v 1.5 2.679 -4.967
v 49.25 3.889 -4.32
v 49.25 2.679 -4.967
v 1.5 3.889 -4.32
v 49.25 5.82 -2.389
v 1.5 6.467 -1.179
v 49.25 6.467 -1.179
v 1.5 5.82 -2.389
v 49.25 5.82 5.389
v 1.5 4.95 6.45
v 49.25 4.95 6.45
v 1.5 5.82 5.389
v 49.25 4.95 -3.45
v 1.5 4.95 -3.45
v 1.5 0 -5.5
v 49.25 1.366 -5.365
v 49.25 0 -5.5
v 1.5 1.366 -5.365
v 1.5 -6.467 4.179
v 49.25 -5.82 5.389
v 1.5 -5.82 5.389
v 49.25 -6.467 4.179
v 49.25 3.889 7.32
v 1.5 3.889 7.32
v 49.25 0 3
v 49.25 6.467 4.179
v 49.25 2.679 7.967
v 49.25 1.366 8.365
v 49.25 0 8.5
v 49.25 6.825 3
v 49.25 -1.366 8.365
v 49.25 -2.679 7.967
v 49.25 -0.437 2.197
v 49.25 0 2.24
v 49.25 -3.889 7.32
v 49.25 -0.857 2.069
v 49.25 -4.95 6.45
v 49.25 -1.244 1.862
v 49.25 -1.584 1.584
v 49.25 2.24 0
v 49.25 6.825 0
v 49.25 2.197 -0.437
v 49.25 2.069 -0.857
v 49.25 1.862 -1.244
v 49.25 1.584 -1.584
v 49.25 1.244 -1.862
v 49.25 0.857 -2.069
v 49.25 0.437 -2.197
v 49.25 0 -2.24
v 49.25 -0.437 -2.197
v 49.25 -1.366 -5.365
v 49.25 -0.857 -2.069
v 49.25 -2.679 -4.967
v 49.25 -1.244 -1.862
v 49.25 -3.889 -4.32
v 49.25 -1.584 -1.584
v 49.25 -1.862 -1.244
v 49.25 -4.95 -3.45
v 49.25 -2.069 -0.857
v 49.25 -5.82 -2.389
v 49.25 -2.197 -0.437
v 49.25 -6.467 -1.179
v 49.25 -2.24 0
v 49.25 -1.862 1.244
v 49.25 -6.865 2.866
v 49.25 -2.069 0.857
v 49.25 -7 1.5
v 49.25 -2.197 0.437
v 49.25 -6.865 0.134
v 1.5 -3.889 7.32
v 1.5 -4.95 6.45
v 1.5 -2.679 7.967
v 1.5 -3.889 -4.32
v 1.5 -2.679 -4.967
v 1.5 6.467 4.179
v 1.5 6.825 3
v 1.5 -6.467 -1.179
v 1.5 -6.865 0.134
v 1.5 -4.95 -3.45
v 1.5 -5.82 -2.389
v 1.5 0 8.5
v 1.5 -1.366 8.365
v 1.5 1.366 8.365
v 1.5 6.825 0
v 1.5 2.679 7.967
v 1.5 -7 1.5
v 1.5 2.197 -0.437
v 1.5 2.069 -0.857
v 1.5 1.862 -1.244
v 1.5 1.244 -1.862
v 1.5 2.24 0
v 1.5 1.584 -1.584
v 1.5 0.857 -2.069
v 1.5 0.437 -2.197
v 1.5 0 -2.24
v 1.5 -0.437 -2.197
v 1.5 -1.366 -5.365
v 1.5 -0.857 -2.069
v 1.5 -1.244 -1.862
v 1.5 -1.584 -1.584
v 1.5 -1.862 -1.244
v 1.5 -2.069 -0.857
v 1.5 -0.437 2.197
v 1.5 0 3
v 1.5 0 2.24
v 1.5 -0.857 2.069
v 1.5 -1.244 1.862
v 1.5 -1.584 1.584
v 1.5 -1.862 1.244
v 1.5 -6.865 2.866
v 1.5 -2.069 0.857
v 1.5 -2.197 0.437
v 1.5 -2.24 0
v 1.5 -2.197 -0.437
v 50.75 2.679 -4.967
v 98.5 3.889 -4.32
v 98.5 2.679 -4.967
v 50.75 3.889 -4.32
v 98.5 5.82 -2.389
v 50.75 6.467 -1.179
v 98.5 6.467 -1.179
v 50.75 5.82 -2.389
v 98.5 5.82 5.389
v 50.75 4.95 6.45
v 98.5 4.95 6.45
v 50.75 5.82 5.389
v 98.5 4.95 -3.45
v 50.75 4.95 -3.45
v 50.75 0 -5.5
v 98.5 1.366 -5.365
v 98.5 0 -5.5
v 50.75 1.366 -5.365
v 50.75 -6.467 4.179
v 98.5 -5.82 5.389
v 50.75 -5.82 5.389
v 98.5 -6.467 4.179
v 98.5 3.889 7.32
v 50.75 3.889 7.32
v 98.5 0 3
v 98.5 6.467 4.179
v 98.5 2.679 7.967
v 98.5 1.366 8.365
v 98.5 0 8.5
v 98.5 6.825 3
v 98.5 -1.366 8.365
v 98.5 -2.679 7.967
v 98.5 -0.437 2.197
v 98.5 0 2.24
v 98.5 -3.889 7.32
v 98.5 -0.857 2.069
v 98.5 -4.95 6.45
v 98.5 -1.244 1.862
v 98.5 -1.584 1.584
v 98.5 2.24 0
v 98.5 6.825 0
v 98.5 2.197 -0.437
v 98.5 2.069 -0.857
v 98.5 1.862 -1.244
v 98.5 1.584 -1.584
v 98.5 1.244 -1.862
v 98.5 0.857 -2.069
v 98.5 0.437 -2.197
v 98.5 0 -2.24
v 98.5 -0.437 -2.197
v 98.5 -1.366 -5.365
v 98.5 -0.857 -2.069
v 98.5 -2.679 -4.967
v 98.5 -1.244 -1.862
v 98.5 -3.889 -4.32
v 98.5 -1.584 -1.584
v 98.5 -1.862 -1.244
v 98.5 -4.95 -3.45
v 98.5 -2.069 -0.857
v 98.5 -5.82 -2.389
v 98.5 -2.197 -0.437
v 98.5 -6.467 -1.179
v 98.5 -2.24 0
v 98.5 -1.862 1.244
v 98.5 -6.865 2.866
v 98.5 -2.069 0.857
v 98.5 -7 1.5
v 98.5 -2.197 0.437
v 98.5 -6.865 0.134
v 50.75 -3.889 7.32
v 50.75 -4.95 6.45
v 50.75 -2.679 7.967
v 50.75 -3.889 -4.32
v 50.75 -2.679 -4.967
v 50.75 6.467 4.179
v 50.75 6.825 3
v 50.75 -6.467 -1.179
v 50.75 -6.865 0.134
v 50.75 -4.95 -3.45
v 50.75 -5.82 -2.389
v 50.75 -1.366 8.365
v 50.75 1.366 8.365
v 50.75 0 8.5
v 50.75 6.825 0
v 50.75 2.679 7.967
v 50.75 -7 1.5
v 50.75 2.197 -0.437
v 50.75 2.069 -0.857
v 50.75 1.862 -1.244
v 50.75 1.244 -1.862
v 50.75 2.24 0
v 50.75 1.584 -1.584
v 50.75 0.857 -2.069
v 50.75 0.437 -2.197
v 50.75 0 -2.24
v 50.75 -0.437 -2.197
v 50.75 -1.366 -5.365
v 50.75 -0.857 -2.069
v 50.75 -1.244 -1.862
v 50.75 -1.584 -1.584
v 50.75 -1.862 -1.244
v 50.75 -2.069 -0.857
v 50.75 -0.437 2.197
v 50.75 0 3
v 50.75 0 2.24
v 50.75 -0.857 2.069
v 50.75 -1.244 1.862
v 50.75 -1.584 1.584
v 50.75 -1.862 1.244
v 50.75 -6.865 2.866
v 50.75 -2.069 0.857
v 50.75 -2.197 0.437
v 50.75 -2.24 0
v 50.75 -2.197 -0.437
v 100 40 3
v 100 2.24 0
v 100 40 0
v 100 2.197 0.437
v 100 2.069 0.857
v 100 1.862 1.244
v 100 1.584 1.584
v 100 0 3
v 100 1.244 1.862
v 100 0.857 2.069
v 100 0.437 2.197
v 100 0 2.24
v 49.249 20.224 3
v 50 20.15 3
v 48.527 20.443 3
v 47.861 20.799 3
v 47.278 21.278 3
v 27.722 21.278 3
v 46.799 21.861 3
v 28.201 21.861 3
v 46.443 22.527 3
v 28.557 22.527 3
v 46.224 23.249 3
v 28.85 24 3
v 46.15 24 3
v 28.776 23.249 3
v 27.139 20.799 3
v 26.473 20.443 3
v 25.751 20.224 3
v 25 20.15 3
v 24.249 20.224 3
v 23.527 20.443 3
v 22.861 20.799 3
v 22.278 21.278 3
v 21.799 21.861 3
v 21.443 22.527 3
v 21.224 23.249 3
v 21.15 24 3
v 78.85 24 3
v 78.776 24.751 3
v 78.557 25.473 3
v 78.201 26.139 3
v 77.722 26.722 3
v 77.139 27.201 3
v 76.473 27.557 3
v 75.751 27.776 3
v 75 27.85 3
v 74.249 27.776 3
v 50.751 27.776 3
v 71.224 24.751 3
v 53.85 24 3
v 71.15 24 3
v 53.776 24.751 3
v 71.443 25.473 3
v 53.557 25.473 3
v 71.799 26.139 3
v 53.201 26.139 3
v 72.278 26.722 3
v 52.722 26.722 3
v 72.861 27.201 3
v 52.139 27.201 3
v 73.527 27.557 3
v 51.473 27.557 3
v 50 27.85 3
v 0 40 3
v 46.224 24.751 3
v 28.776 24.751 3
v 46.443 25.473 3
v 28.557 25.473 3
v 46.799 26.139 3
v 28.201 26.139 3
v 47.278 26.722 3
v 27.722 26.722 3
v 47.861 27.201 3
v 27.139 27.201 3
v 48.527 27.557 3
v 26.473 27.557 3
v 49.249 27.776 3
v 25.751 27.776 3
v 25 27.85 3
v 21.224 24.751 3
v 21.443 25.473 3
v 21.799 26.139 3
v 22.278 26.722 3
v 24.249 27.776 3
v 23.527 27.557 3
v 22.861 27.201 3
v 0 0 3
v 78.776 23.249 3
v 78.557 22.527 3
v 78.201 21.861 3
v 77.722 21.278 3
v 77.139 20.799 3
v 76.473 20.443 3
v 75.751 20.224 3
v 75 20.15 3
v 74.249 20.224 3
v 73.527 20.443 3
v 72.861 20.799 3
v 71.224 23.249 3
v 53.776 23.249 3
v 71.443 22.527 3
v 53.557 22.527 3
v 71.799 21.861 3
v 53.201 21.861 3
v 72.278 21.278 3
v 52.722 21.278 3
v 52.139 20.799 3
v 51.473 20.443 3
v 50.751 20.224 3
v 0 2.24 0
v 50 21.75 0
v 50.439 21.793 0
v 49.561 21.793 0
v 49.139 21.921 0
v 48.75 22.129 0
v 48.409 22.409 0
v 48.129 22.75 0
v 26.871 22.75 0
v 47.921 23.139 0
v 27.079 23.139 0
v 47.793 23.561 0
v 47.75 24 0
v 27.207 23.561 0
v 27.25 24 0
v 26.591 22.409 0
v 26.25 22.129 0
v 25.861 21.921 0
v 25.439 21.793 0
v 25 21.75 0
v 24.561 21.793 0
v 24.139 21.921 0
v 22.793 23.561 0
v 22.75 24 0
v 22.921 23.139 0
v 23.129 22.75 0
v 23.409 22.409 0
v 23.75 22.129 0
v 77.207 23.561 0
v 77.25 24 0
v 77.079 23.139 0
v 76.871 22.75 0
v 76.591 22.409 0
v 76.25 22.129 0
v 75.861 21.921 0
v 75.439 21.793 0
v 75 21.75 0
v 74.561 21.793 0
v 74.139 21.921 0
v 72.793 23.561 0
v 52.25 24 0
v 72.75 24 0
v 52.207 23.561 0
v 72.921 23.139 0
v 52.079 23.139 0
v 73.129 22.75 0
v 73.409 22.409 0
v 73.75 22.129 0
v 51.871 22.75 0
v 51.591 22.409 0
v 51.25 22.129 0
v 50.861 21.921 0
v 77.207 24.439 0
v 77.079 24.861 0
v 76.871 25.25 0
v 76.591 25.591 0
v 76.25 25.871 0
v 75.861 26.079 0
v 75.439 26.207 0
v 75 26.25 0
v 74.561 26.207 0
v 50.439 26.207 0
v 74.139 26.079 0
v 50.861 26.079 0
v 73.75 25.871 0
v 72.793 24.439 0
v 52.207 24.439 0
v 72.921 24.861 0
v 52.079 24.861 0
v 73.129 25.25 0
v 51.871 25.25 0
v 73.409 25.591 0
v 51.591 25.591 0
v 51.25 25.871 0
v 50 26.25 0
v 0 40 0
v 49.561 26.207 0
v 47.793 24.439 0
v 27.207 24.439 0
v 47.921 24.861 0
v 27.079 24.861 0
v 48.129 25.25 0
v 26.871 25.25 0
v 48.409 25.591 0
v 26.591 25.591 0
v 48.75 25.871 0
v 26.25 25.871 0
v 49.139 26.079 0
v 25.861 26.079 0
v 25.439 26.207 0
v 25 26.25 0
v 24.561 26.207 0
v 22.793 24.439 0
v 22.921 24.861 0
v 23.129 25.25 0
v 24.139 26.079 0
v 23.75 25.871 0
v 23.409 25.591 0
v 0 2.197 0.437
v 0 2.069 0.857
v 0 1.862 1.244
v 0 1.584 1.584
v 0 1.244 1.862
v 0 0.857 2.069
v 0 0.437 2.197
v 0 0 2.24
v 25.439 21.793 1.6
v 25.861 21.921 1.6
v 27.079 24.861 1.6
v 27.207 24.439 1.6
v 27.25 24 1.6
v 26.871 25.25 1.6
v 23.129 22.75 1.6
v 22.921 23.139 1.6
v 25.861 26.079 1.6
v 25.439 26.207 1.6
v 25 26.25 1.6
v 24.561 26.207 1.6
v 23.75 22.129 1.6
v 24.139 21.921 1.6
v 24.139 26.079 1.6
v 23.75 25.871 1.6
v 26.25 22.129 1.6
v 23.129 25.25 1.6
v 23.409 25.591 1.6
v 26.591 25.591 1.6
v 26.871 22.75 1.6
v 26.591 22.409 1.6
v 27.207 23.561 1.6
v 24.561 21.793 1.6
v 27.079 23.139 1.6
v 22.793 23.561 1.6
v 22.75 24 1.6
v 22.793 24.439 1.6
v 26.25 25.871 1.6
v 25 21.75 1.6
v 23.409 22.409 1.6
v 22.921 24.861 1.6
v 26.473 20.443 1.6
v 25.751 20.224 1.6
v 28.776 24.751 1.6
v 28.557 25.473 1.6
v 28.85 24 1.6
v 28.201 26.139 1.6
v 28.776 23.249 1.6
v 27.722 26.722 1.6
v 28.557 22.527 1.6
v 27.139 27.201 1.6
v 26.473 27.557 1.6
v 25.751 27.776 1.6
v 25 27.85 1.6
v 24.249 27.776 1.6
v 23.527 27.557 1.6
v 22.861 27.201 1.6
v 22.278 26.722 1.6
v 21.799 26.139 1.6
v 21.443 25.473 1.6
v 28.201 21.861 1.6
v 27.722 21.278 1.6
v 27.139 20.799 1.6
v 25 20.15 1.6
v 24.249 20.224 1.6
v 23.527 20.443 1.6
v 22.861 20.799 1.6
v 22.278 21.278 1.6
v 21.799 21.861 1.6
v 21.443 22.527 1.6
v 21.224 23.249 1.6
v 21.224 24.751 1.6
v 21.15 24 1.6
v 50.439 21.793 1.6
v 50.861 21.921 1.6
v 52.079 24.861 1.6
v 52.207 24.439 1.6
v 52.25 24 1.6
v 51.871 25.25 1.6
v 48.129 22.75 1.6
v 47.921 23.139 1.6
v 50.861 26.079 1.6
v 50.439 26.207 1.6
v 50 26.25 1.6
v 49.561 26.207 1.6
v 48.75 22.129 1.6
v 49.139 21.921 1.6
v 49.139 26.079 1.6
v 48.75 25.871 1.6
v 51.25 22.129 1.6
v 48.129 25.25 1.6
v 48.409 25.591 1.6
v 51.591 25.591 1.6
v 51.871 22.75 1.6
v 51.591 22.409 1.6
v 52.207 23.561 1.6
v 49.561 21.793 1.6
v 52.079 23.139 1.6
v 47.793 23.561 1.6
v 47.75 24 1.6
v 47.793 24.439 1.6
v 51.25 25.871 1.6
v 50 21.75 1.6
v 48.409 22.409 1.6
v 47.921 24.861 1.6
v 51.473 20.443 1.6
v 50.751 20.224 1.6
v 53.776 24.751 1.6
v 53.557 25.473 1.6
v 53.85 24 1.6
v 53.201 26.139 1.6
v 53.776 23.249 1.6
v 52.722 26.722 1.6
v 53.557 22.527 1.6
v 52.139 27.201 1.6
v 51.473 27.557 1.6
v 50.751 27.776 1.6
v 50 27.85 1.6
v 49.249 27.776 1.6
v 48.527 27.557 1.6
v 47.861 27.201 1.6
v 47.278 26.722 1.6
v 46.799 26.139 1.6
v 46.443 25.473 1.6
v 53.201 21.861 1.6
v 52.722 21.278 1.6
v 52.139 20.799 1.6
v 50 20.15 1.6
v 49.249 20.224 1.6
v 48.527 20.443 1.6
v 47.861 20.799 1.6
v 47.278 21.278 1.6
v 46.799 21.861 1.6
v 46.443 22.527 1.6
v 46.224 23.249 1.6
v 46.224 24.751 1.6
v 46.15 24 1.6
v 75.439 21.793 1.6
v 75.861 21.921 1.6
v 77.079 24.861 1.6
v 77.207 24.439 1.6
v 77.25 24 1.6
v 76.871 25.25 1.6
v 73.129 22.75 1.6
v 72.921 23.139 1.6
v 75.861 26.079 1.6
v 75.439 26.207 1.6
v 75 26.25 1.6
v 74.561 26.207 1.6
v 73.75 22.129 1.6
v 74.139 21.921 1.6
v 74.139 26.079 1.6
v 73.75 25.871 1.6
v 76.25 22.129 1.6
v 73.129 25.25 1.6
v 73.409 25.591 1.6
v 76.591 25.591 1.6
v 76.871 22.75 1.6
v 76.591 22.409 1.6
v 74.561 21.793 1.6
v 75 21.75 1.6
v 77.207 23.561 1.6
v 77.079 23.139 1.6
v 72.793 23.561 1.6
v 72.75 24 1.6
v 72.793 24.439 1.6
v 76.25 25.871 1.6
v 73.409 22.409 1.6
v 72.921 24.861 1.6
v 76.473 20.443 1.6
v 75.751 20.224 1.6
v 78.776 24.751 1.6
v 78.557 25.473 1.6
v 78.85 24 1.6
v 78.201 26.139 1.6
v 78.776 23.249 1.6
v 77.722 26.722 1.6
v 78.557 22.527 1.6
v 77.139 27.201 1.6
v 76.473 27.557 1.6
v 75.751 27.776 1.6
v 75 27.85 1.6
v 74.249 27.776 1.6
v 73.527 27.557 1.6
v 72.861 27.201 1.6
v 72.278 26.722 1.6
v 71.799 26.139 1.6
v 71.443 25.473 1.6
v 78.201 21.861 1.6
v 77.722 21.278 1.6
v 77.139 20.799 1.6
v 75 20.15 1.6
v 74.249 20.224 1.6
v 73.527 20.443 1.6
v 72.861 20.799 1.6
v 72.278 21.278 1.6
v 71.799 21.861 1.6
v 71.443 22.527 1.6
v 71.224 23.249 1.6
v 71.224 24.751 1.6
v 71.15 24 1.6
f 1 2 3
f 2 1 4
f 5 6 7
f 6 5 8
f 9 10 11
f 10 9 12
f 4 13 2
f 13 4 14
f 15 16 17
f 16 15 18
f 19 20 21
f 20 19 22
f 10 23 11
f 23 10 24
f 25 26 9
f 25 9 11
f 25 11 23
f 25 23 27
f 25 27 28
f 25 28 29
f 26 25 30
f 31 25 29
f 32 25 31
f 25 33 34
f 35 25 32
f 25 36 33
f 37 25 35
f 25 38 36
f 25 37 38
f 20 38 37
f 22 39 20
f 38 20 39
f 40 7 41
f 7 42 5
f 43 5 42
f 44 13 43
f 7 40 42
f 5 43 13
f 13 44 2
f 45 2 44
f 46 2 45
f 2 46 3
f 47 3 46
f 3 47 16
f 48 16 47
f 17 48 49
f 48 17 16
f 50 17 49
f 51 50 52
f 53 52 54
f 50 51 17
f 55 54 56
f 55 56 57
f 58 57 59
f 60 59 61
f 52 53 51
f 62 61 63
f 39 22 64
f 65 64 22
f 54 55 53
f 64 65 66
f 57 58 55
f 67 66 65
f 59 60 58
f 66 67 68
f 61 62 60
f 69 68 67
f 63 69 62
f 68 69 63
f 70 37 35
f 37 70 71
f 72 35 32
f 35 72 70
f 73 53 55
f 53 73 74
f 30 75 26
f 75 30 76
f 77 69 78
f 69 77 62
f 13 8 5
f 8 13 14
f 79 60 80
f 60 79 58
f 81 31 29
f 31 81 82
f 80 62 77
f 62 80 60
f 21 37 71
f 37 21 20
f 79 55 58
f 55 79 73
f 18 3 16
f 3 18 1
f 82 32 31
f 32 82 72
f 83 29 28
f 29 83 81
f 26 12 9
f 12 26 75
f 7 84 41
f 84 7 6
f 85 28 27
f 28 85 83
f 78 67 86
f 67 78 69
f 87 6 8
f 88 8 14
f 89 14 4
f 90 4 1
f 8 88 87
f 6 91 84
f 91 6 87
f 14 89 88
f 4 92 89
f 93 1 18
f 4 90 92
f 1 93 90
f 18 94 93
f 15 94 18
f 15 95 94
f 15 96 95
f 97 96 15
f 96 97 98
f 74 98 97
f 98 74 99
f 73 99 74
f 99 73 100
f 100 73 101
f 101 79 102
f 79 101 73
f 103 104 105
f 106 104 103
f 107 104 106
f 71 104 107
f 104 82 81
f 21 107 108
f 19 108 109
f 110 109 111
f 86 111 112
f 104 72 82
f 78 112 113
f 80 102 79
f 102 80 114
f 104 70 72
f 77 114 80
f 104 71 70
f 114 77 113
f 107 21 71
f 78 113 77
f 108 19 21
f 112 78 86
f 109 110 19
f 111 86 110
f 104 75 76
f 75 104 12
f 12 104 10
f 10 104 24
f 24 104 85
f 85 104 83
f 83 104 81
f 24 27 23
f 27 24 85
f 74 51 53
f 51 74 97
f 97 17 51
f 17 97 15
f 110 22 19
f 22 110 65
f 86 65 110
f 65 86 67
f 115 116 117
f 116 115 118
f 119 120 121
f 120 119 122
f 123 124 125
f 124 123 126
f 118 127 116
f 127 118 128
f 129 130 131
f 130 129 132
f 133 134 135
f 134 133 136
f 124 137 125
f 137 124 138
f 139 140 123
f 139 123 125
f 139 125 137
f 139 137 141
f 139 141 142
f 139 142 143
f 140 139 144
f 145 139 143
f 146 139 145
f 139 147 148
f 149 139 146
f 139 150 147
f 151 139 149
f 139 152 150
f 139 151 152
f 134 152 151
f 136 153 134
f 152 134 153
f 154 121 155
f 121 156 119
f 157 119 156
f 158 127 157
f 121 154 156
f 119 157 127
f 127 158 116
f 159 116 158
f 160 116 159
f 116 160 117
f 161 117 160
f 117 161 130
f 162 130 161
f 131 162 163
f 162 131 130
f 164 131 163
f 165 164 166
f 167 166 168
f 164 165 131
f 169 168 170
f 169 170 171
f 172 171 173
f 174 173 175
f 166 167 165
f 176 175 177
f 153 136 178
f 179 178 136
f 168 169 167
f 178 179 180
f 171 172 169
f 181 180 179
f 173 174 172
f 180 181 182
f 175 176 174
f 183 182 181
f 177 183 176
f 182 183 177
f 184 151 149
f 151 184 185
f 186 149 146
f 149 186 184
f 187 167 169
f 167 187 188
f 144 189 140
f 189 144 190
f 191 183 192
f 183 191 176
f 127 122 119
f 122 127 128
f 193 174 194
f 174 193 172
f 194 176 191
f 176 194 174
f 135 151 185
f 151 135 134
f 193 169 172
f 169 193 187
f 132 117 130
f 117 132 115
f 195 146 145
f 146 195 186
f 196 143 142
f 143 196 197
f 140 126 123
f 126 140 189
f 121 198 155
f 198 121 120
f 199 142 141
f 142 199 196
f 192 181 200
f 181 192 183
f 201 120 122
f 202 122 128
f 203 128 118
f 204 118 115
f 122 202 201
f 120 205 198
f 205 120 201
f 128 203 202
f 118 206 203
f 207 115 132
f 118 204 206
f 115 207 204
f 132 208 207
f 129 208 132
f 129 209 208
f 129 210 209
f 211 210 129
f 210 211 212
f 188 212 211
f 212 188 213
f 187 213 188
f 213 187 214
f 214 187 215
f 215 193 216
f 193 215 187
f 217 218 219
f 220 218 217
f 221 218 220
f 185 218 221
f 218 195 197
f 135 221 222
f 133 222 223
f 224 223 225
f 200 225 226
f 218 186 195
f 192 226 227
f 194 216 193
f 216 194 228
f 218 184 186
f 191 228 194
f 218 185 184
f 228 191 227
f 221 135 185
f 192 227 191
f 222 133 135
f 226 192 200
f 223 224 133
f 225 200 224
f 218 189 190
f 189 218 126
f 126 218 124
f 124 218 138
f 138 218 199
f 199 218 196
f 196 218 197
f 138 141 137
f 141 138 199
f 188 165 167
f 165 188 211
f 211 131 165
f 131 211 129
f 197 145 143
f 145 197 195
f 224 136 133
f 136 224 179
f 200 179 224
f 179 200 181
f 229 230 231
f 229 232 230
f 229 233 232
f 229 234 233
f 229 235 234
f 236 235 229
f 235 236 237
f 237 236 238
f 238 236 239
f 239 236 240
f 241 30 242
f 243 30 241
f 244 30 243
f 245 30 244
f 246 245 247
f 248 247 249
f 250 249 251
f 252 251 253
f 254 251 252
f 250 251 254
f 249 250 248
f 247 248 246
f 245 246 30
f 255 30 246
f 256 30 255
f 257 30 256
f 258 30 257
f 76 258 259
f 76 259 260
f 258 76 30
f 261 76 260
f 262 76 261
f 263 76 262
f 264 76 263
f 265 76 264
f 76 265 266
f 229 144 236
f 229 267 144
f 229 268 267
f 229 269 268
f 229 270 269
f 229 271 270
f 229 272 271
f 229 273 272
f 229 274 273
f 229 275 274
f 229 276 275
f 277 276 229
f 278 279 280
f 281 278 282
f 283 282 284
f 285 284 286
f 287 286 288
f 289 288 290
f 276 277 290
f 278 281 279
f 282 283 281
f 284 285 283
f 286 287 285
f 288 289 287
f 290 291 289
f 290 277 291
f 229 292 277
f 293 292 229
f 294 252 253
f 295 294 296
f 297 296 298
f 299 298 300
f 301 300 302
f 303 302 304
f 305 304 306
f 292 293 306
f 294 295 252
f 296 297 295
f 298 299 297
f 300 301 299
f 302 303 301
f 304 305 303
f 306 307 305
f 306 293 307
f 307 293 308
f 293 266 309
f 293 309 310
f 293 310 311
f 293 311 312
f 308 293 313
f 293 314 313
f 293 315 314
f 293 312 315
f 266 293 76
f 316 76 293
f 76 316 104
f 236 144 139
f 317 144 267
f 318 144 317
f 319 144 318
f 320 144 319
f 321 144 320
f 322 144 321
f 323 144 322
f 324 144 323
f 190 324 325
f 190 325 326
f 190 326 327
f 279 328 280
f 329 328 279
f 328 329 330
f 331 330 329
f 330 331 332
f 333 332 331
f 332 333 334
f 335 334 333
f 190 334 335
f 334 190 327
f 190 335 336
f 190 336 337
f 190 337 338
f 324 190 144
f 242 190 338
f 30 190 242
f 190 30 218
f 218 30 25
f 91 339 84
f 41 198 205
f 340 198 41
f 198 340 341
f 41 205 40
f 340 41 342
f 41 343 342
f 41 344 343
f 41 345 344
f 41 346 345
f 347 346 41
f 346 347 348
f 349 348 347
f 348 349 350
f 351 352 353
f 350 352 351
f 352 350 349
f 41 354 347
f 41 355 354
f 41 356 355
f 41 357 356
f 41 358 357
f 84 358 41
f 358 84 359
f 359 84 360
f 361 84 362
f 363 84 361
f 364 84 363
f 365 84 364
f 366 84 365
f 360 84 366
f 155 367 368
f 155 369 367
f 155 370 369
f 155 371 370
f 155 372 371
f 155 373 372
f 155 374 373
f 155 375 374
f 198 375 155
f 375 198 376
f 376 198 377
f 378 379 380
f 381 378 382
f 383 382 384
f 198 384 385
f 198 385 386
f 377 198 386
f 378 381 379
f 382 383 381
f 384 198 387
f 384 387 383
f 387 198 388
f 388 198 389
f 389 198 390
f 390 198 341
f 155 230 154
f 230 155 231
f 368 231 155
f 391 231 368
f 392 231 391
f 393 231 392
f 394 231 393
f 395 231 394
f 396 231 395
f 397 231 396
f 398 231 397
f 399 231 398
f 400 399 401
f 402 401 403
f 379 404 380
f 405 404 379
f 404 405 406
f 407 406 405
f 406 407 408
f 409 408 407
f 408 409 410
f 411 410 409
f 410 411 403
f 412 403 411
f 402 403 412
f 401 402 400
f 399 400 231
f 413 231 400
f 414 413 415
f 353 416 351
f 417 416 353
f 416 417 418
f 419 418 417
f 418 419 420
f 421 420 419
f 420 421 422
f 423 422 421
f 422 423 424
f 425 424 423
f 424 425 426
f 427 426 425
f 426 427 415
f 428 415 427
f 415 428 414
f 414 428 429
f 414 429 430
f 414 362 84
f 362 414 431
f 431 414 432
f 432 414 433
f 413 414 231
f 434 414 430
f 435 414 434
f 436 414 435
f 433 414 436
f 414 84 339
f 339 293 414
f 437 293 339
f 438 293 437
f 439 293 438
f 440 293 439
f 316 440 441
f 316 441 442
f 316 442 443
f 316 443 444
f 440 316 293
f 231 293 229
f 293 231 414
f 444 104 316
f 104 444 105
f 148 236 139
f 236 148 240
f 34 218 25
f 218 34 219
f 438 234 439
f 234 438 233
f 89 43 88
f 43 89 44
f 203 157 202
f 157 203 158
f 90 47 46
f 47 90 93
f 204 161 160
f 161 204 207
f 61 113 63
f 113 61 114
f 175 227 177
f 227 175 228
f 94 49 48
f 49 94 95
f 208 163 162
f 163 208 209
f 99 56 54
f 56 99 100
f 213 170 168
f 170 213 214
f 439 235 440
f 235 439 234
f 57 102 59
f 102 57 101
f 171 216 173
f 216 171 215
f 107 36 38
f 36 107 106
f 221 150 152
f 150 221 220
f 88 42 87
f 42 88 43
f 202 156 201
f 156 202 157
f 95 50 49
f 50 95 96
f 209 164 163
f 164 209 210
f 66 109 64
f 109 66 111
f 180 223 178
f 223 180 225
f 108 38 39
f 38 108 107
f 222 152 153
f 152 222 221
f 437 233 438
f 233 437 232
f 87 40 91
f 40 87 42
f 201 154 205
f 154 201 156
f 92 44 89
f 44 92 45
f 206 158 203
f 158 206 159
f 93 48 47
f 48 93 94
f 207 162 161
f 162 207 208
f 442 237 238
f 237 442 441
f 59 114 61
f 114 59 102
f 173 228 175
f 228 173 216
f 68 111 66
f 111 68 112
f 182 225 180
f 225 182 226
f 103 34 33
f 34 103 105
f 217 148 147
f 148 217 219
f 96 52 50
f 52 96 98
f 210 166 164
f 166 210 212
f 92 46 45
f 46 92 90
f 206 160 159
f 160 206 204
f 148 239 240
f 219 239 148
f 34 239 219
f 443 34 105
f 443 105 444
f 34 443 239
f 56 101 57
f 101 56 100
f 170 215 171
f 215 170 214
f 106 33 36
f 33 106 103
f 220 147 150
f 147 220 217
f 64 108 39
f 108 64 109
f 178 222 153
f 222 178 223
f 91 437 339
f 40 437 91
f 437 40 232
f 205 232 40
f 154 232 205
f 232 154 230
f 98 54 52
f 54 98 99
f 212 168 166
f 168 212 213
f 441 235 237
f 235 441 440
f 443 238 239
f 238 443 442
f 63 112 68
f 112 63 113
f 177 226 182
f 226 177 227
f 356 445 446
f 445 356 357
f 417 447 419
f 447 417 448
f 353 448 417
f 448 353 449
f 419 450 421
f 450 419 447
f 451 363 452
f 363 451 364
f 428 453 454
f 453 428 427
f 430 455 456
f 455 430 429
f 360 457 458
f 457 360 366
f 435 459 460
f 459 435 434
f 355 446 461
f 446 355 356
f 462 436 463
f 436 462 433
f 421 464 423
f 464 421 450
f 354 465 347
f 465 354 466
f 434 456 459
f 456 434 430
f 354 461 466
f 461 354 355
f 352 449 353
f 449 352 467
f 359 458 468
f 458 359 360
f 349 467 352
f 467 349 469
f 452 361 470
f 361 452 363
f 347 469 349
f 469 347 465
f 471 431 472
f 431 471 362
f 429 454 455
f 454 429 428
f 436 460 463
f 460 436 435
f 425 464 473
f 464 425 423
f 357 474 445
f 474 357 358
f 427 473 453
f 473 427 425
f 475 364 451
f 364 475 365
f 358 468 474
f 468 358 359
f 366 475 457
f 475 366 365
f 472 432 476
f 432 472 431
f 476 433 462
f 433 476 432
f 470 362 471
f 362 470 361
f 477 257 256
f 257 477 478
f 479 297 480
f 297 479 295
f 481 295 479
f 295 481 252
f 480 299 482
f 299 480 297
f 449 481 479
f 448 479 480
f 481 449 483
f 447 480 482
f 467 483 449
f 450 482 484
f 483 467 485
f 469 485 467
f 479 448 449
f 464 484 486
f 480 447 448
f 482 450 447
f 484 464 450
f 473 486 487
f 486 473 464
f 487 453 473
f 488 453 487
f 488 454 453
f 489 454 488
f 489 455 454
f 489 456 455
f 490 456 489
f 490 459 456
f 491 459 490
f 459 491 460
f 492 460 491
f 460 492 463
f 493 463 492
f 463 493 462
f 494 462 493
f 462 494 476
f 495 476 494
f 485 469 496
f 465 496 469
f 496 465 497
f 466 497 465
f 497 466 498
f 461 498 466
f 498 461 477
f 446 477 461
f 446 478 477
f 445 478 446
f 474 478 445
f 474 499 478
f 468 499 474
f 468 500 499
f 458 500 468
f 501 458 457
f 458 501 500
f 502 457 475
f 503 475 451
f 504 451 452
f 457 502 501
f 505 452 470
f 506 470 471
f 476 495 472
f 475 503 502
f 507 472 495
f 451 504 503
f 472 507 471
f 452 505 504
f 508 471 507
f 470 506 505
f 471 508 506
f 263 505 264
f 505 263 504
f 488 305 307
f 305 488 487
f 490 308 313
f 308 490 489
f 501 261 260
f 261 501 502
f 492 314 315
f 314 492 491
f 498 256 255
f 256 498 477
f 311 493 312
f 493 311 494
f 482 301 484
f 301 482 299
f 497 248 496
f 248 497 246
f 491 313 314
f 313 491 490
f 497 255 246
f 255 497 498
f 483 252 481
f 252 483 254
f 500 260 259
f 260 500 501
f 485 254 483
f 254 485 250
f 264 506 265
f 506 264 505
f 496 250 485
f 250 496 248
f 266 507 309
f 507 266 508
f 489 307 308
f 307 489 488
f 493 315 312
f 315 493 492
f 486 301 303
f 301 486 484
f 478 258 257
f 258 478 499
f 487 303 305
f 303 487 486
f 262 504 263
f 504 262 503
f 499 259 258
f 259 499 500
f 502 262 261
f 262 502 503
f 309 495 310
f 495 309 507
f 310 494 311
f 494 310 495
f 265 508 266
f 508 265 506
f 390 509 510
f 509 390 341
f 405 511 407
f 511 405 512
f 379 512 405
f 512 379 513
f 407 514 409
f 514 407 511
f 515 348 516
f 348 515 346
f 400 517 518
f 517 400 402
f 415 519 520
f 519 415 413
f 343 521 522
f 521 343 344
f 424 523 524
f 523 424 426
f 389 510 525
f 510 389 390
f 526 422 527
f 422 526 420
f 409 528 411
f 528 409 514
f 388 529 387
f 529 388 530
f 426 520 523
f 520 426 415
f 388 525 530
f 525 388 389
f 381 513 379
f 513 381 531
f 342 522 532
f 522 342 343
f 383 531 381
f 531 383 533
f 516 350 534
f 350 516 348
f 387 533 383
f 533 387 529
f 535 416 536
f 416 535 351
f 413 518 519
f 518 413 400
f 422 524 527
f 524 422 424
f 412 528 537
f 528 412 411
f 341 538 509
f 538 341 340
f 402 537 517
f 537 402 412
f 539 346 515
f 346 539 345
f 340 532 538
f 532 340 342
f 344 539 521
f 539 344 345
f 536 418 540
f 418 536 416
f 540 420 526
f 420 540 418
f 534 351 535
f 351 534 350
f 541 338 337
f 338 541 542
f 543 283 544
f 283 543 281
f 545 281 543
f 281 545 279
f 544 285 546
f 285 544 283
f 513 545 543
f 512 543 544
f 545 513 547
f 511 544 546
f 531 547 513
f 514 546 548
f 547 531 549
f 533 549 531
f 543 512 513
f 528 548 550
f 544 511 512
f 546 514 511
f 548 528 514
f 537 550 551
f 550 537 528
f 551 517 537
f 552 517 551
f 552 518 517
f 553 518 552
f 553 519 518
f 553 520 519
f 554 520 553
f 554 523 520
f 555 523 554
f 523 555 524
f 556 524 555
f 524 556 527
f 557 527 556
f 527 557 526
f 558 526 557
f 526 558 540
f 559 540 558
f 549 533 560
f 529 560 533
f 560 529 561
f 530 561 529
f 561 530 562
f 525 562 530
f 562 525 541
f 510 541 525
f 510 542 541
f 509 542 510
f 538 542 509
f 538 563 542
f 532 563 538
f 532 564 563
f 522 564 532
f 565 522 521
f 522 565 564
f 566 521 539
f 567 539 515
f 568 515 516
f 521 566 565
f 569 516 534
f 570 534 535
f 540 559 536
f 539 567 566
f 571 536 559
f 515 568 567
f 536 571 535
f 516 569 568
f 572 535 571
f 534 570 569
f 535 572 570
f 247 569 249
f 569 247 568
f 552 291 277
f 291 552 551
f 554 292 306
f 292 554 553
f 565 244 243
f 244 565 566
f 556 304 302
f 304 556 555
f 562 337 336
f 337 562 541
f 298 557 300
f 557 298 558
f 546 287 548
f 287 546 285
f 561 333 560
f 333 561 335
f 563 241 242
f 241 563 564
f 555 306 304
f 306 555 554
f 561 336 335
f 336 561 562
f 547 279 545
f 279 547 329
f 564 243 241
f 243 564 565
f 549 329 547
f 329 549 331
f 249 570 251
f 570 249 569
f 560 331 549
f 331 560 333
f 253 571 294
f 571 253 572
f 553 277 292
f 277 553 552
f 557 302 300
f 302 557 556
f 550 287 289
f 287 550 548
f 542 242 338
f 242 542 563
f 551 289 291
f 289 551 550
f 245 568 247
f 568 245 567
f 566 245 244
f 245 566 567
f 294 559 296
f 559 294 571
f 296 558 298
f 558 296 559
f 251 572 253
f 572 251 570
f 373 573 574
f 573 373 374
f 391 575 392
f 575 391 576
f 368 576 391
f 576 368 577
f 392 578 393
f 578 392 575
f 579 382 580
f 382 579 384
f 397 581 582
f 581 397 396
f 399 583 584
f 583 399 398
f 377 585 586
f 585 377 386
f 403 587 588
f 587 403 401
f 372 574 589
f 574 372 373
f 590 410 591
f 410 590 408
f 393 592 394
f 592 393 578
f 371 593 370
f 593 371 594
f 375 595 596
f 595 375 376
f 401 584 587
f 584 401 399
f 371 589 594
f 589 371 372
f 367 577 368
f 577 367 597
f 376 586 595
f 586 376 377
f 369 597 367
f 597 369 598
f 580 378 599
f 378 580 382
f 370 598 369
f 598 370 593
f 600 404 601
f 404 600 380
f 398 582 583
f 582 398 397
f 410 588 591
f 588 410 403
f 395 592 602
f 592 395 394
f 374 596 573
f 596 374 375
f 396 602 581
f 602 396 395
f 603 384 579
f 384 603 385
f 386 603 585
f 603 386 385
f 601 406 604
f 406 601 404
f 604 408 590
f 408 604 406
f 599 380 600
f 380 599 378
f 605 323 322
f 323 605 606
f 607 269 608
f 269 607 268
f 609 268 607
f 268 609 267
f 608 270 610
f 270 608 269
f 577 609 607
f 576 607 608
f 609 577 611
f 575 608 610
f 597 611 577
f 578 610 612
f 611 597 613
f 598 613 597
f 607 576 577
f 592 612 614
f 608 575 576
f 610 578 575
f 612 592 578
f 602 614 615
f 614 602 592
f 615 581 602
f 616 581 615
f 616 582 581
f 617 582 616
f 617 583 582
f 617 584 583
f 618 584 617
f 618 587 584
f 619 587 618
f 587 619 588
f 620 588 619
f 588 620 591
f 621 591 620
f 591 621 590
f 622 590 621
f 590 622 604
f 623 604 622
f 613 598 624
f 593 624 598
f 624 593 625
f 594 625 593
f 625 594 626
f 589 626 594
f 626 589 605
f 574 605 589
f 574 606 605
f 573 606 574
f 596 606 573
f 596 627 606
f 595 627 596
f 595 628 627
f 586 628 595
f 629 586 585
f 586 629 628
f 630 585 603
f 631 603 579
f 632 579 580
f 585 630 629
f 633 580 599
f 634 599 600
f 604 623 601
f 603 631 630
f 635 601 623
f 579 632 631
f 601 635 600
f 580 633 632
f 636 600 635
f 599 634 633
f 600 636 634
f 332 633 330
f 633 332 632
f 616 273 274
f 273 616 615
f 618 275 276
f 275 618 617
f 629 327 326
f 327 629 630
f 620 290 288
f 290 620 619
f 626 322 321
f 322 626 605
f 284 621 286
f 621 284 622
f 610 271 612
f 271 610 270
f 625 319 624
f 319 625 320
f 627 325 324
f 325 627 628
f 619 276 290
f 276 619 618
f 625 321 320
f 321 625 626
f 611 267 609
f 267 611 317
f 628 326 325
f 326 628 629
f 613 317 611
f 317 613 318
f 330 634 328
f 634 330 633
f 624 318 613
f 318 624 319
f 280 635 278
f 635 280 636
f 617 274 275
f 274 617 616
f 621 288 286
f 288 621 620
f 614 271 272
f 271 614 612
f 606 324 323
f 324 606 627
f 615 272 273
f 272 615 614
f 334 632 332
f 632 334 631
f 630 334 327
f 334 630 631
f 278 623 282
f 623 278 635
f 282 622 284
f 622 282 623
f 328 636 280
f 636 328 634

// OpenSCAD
$fn = 32;

// ----------------------------------------------------------------------
// Hinge leaf: 100 x 47 x 14 mm
// ----------------------------------------------------------------------

// --- parameters (mm) ---
tab_len = 100;            // leaf length, X
tab_w = 40;               // leaf width, Y
tab_t = 3;                // leaf thickness
ring_d = 14;              // knuckle diameter
ring_w = 47.75;           // knuckle width
knuckle_n = 2;            // number of knuckles
pin_d = 4.48;             // pin bore
gap = 1.5;                // gap between the knuckles
screw_d = 4.5;            // screw clearance
cs_d = 7.7;               // countersink diameter
cs_h = 1.4;               // countersink depth

module leaf() {
  cube([tab_len, tab_w, tab_t]);
}

module knuckles() {
  /* barrels sit on the leaf edge, the pin axis at half the leaf thickness */
  for (i = [0 : knuckle_n - 1])
    translate([gap + i * (ring_w + gap), 0, tab_t * 0.5])
      rotate([0, 90, 0]) cylinder(h = ring_w, d = ring_d);
}

difference() {
  union() {
    leaf();
    knuckles();
  }
  rotate([0, 90, 0]) translate([0, 0, -1])
    cylinder(h = tab_len + 2, d = pin_d);
  translate([25, tab_w * 0.6, -1]) cylinder(h = tab_t + 2, d = screw_d);
  translate([25, tab_w * 0.6, tab_t - cs_h]) cylinder(h = cs_h + 0.5, d = cs_d);
  translate([50, tab_w * 0.6, -1]) cylinder(h = tab_t + 2, d = screw_d);
  translate([50, tab_w * 0.6, tab_t - cs_h]) cylinder(h = cs_h + 0.5, d = cs_d);
  translate([75, tab_w * 0.6, -1]) cylinder(h = tab_t + 2, d = screw_d);
  translate([75, tab_w * 0.6, tab_t - cs_h]) cylinder(h = cs_h + 0.5, d = cs_d);
}
